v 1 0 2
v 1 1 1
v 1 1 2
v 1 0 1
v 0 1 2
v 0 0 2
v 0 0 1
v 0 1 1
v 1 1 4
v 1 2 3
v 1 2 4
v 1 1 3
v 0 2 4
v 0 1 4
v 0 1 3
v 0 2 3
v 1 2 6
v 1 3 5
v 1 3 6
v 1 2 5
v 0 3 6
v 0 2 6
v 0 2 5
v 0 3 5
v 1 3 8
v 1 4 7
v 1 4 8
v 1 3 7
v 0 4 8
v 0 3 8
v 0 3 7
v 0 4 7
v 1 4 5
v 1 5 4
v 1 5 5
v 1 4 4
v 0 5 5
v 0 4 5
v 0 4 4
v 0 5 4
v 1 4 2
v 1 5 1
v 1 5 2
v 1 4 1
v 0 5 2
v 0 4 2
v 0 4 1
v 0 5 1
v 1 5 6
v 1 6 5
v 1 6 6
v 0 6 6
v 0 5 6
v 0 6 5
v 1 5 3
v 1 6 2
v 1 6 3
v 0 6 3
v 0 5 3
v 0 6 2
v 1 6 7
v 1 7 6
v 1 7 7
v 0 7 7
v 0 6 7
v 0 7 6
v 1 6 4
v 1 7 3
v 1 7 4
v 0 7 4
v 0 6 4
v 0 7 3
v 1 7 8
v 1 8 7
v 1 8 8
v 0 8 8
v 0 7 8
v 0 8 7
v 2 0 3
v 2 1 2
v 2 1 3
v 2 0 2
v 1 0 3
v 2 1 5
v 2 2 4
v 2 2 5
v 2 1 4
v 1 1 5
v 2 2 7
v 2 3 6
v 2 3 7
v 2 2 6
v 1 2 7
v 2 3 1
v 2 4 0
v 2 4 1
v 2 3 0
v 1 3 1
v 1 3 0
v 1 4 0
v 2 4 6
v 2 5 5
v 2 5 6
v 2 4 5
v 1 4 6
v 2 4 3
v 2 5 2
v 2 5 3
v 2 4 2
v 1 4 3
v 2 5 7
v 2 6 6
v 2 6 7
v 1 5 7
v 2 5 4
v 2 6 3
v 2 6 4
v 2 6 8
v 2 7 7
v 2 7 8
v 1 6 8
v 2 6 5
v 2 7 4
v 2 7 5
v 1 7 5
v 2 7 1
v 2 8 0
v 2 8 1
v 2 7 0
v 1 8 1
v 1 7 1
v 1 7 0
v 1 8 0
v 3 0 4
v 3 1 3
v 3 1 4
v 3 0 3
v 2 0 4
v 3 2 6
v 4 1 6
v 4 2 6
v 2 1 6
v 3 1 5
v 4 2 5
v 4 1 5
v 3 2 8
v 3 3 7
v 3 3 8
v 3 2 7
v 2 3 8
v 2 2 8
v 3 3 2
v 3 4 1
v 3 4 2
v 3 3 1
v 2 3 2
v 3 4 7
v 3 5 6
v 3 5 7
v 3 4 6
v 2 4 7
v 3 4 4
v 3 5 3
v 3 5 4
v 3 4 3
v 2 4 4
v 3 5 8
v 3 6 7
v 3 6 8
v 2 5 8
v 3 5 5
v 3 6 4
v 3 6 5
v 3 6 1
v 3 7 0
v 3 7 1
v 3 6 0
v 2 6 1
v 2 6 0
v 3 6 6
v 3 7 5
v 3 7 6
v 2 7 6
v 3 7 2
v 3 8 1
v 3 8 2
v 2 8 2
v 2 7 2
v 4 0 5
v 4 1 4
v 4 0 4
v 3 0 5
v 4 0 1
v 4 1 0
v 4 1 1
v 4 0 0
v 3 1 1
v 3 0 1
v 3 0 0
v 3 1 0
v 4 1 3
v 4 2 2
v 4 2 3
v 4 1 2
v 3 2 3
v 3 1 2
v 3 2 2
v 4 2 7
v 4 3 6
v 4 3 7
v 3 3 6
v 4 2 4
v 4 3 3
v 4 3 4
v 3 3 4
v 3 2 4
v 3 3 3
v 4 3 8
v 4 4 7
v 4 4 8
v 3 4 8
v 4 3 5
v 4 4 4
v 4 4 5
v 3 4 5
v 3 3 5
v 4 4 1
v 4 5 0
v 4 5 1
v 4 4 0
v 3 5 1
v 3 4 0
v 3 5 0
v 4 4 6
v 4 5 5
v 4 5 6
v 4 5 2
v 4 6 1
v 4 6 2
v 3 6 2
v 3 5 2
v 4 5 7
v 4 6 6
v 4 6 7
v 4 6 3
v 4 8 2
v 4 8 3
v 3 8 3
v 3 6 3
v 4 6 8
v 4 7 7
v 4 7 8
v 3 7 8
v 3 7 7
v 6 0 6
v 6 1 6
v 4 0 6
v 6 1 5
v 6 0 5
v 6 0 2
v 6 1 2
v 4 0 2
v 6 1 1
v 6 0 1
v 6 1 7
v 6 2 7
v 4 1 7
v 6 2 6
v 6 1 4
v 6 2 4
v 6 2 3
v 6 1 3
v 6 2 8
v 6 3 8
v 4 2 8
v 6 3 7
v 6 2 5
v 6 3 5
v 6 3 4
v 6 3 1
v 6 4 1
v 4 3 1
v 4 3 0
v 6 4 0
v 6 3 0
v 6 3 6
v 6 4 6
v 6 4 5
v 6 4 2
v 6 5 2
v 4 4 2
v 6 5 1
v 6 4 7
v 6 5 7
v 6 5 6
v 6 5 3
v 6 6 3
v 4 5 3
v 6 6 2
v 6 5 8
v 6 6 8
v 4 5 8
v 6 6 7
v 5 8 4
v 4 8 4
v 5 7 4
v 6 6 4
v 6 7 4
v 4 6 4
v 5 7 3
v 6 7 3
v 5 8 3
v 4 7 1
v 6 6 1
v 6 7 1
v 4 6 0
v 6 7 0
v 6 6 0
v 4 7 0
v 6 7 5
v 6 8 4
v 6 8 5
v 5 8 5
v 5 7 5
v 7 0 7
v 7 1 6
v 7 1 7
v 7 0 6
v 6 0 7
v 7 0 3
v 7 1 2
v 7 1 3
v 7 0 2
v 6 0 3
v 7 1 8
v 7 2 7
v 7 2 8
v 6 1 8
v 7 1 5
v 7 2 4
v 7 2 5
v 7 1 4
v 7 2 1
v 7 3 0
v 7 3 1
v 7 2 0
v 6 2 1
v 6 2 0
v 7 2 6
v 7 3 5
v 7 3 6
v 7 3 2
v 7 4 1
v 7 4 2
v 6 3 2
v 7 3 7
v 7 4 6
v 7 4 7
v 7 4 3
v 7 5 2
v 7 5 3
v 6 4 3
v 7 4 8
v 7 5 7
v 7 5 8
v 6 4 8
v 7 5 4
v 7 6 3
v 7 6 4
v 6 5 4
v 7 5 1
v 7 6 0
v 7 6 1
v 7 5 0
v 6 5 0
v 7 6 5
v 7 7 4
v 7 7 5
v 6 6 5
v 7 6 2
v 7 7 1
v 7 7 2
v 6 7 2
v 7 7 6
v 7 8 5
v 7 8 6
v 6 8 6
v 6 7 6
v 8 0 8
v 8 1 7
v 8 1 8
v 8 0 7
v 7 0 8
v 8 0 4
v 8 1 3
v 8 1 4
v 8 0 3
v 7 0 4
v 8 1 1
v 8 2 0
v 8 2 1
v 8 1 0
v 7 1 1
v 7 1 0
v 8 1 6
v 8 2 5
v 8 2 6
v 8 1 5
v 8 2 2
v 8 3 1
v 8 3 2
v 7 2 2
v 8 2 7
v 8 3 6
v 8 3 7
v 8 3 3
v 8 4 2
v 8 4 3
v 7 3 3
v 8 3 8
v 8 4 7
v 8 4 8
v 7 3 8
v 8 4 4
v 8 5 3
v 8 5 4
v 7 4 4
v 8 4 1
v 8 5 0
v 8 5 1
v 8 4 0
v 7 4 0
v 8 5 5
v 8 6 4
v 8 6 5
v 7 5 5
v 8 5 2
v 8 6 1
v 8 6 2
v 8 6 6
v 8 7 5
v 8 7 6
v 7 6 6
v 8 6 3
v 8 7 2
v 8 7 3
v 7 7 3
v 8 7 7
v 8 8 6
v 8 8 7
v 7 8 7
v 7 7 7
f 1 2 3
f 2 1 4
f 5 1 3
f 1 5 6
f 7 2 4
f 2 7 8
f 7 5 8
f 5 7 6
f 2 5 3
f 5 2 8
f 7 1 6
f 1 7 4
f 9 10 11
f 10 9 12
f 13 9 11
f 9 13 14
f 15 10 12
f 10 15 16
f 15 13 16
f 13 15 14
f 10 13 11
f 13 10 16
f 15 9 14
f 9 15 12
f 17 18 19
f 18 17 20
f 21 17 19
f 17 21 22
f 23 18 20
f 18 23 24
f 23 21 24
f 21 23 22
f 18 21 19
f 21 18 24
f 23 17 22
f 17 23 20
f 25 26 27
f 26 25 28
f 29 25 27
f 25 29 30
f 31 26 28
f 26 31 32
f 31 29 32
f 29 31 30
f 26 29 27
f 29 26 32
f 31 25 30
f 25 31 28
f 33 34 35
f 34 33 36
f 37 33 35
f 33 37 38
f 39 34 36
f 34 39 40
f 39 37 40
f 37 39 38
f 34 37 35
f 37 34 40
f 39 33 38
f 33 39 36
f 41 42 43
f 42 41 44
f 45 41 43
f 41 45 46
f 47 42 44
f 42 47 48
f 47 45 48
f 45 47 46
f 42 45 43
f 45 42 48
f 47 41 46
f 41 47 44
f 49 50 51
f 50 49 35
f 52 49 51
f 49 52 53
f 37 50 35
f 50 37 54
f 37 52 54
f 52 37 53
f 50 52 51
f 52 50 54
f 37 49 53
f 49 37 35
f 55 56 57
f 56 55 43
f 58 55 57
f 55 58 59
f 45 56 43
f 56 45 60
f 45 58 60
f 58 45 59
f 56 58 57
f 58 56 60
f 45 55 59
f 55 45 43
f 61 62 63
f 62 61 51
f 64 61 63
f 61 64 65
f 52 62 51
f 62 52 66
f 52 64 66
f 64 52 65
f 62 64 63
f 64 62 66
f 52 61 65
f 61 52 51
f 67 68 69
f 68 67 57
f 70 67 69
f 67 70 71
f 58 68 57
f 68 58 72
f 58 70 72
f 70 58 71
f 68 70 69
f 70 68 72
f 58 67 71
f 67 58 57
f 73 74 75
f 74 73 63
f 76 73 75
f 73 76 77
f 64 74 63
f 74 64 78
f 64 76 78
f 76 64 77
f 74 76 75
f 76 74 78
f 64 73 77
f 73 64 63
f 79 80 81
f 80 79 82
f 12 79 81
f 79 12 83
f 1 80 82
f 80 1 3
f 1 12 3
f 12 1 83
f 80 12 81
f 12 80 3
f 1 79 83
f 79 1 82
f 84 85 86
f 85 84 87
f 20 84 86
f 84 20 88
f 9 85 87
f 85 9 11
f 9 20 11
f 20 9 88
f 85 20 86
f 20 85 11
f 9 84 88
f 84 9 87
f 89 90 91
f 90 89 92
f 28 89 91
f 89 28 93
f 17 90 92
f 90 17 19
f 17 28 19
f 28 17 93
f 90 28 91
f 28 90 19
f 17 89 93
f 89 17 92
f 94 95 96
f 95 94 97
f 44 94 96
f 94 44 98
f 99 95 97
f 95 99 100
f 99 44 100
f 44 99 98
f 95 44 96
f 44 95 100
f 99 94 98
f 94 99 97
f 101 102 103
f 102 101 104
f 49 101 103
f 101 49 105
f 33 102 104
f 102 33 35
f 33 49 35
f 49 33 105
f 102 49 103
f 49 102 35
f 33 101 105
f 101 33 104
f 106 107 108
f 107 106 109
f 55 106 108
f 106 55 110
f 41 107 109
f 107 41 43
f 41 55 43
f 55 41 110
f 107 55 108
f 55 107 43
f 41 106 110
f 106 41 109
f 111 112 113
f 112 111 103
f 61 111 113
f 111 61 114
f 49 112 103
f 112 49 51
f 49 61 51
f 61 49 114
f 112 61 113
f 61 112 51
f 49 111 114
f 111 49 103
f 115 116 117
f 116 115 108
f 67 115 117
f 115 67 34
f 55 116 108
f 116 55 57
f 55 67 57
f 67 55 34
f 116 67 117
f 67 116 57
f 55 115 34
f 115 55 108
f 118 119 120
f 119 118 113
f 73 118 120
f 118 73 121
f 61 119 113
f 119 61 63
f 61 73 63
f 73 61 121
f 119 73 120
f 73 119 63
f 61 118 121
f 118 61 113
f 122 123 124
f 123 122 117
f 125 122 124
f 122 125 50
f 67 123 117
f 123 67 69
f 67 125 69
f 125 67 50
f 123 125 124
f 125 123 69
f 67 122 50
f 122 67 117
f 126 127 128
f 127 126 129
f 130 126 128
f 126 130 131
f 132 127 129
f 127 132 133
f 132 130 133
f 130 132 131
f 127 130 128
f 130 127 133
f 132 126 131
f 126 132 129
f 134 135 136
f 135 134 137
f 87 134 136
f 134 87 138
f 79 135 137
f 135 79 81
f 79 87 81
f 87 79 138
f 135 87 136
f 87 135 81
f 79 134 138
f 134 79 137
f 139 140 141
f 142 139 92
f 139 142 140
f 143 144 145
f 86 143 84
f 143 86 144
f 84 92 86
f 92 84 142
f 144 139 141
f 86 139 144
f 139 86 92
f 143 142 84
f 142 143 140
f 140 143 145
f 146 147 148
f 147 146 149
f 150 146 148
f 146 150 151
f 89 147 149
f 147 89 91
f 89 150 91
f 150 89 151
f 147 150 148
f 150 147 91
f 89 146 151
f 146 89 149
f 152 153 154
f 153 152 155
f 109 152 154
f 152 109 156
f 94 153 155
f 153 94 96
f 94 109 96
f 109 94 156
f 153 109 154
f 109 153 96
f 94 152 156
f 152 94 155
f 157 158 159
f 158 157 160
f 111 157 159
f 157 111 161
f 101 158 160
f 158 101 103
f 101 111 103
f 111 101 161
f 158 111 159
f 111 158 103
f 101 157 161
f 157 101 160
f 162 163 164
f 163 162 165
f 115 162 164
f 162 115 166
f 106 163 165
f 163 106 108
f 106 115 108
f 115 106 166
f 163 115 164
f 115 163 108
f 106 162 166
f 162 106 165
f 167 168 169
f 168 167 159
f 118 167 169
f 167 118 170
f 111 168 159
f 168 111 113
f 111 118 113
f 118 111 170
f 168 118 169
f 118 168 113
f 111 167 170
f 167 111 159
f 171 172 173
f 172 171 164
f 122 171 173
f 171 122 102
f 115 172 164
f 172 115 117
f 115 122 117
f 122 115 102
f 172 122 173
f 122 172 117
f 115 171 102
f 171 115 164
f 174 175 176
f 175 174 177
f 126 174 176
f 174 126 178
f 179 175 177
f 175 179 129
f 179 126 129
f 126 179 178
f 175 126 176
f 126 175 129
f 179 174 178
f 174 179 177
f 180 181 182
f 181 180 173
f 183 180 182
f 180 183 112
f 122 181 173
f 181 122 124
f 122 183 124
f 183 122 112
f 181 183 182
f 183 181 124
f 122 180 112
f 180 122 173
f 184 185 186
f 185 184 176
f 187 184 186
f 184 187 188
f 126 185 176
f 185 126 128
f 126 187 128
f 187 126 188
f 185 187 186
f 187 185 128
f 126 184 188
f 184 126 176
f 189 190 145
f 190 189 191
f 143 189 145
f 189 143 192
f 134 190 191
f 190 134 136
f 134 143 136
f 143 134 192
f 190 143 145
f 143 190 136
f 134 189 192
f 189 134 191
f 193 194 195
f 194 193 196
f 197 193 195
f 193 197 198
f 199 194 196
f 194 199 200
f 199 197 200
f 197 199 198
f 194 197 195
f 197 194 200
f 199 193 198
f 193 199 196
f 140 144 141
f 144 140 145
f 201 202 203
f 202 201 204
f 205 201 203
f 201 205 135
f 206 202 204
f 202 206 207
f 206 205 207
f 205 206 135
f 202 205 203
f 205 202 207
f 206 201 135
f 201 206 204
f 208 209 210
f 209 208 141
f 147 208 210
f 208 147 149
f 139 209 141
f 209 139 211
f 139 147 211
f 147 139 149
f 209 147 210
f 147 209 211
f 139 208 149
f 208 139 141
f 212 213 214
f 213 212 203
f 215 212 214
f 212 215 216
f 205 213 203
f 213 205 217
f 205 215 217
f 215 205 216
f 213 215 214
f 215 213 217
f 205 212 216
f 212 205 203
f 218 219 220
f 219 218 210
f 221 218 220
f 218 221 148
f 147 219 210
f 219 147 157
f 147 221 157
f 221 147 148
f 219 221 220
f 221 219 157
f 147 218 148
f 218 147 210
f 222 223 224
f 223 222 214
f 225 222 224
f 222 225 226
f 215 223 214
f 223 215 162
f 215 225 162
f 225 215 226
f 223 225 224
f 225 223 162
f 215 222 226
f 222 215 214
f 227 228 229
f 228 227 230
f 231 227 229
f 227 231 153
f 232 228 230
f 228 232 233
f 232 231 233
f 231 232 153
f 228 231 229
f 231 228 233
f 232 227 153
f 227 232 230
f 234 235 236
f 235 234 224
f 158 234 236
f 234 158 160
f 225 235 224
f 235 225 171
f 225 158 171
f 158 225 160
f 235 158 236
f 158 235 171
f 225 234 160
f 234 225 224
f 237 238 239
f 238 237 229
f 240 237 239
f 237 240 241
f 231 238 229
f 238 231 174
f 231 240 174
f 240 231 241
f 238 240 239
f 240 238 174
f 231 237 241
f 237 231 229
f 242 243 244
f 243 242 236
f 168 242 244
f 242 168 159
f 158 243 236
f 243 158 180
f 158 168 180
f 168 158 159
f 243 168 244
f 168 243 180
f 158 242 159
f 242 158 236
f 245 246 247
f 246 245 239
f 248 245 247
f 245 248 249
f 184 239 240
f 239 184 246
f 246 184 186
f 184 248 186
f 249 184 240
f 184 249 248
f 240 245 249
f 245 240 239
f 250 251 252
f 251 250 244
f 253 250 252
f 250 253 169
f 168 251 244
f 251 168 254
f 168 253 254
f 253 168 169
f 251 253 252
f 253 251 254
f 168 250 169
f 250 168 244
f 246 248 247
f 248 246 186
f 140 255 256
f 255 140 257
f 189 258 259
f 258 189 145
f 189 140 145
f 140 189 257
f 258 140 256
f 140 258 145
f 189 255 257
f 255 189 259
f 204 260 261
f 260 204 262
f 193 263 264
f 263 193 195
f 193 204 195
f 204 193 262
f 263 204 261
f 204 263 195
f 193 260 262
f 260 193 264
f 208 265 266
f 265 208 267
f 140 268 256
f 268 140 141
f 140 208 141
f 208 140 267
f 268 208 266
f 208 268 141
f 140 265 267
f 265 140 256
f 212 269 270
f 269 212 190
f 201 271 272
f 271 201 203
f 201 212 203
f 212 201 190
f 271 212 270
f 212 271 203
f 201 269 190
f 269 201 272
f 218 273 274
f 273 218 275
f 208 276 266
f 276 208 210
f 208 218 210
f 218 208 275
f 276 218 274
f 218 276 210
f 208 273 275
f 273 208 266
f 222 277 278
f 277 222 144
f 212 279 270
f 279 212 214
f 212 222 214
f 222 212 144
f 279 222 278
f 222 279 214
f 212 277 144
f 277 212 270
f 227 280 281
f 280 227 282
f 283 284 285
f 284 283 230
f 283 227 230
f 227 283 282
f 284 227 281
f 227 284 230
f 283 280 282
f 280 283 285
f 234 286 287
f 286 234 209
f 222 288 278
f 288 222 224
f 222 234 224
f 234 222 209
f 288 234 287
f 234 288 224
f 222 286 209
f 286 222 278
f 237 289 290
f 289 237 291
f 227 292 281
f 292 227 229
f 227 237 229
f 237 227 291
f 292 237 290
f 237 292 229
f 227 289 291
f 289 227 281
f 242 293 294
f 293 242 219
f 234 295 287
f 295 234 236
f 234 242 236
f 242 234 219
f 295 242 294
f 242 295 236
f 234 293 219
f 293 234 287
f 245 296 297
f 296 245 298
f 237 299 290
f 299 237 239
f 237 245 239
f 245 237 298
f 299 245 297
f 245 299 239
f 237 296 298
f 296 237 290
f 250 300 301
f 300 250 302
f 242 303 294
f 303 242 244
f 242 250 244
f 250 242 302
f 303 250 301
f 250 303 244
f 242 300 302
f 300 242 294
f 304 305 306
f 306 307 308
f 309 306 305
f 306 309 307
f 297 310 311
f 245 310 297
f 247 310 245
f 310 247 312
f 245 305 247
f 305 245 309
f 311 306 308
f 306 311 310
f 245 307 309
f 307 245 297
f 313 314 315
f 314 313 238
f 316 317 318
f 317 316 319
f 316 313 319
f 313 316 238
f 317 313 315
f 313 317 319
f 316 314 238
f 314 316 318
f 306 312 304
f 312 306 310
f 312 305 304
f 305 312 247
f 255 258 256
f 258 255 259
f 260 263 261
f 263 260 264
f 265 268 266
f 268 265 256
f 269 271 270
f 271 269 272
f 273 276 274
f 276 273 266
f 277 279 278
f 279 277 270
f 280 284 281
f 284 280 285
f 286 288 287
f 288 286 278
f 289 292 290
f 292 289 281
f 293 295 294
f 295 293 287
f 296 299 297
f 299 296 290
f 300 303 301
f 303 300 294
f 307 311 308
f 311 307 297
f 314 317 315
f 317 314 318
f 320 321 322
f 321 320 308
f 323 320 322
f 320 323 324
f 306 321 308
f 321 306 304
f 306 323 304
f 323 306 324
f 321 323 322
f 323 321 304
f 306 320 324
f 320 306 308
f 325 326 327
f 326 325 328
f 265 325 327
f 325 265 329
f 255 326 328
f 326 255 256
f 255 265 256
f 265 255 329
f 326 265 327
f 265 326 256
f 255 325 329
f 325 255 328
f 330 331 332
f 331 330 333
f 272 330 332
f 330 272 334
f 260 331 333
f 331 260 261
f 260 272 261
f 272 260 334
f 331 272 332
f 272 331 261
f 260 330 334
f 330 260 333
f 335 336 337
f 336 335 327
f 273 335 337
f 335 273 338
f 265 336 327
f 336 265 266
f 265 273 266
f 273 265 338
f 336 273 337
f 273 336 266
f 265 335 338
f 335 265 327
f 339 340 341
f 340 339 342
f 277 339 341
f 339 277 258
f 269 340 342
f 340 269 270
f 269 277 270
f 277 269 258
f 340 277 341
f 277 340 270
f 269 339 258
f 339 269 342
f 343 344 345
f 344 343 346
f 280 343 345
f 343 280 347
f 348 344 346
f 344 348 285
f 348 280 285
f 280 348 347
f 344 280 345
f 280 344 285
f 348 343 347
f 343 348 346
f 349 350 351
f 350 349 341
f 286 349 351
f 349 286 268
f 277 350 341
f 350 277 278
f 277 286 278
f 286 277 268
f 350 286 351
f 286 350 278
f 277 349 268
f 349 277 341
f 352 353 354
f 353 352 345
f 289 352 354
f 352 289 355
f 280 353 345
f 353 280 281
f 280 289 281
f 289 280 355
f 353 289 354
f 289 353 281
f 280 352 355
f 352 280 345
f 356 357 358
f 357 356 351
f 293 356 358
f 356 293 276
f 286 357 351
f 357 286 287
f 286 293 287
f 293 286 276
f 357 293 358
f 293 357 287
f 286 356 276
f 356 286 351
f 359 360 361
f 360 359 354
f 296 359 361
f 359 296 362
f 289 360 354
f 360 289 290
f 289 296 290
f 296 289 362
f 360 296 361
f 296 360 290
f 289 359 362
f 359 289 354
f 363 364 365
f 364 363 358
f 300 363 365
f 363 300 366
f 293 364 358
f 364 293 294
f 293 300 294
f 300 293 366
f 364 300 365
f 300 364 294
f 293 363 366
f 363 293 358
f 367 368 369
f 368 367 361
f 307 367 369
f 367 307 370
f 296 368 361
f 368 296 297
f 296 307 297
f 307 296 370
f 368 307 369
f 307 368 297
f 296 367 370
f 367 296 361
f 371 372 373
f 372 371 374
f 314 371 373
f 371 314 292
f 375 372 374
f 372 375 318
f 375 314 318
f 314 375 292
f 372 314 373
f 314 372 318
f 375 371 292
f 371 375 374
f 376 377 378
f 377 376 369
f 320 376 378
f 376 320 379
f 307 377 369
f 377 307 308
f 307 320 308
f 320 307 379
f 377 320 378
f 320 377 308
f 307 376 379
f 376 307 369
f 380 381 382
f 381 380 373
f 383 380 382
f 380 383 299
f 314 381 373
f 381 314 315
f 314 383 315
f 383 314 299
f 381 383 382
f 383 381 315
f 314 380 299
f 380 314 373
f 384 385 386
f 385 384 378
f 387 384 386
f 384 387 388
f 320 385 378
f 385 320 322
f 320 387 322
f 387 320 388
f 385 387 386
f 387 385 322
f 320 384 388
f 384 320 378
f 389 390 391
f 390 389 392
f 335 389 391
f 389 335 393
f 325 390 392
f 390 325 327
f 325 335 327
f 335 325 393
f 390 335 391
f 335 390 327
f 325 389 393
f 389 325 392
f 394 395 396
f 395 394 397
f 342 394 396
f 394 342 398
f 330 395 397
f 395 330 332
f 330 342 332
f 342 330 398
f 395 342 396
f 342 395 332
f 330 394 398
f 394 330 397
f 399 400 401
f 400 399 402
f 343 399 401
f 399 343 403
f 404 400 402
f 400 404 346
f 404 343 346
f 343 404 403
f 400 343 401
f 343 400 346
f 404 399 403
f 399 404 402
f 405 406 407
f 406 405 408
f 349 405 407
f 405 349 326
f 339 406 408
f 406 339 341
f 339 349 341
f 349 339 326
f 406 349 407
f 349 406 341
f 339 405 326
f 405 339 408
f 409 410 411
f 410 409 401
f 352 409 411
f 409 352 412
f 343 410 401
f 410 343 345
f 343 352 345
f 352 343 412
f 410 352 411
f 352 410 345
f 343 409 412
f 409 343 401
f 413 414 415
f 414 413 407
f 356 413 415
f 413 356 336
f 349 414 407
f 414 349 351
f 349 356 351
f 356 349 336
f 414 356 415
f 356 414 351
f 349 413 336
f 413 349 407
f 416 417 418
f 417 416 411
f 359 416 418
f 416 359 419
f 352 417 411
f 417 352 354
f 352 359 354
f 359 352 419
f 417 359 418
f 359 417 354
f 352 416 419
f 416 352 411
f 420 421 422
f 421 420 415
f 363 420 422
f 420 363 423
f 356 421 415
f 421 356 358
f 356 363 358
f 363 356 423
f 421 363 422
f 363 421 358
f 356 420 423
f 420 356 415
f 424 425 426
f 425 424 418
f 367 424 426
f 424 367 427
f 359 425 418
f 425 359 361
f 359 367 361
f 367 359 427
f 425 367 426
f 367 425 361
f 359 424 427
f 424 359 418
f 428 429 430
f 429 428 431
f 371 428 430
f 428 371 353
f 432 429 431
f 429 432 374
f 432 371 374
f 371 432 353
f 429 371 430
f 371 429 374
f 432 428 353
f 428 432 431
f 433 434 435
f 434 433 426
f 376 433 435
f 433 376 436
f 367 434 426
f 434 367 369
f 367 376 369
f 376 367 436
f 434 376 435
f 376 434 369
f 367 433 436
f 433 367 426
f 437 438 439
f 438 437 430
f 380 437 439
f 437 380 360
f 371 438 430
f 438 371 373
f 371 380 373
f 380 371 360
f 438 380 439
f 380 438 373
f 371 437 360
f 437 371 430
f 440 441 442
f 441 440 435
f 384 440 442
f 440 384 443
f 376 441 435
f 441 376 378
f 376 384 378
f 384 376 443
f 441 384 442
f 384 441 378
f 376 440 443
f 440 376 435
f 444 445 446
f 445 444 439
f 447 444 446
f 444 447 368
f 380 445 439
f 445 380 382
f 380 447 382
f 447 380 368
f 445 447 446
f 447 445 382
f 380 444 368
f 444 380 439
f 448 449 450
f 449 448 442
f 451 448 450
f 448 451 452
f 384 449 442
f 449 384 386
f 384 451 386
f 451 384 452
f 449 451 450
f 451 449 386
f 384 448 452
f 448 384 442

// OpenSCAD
union() {
    translate([0, 0, 1]) cube([1, 1, 1]);
    translate([0, 1, 3]) cube([1, 1, 1]);
    translate([0, 2, 5]) cube([1, 1, 1]);
    translate([0, 3, 7]) cube([1, 1, 1]);
    translate([0, 4, 4]) cube([1, 1, 1]);
    translate([0, 4, 1]) cube([1, 1, 1]);
    translate([0, 5, 5]) cube([1, 1, 1]);
    translate([0, 5, 2]) cube([1, 1, 1]);
    translate([0, 6, 6]) cube([1, 1, 1]);
    translate([0, 6, 3]) cube([1, 1, 1]);
    translate([0, 7, 7]) cube([1, 1, 1]);
    translate([1, 0, 2]) cube([1, 1, 1]);
    translate([1, 1, 4]) cube([1, 1, 1]);
    translate([1, 2, 6]) cube([1, 1, 1]);
    translate([1, 3, 0]) cube([1, 1, 1]);
    translate([1, 4, 5]) cube([1, 1, 1]);
    translate([1, 4, 2]) cube([1, 1, 1]);
    translate([1, 5, 6]) cube([1, 1, 1]);
    translate([1, 5, 3]) cube([1, 1, 1]);
    translate([1, 6, 7]) cube([1, 1, 1]);
    translate([1, 6, 4]) cube([1, 1, 1]);
    translate([1, 7, 0]) cube([1, 1, 1]);
    translate([2, 0, 3]) cube([1, 1, 1]);
    translate([2, 1, 5]) cube([1, 1, 1]);
    translate([2, 2, 7]) cube([1, 1, 1]);
    translate([2, 3, 1]) cube([1, 1, 1]);
    translate([2, 4, 6]) cube([1, 1, 1]);
    translate([2, 4, 3]) cube([1, 1, 1]);
    translate([2, 5, 7]) cube([1, 1, 1]);
    translate([2, 5, 4]) cube([1, 1, 1]);
    translate([2, 6, 0]) cube([1, 1, 1]);
    translate([2, 6, 5]) cube([1, 1, 1]);
    translate([2, 7, 1]) cube([1, 1, 1]);
    translate([3, 0, 4]) cube([1, 1, 1]);
    translate([3, 0, 0]) cube([1, 1, 1]);
    translate([3, 1, 5]) cube([1, 1, 1]);
    translate([3, 1, 2]) cube([1, 1, 1]);
    translate([3, 2, 6]) cube([1, 1, 1]);
    translate([3, 2, 3]) cube([1, 1, 1]);
    translate([3, 3, 7]) cube([1, 1, 1]);
    translate([3, 3, 4]) cube([1, 1, 1]);
    translate([3, 4, 0]) cube([1, 1, 1]);
    translate([3, 4, 5]) cube([1, 1, 1]);
    translate([3, 5, 1]) cube([1, 1, 1]);
    translate([3, 5, 6]) cube([1, 1, 1]);
    translate([3, 6, 2]) cube([1, 1, 1]);
    translate([3, 6, 7]) cube([1, 1, 1]);
    translate([3, 7, 2]) cube([1, 1, 1]);
    translate([4, 0, 5]) cube([1, 1, 1]);
    translate([4, 0, 1]) cube([1, 1, 1]);
    translate([4, 1, 6]) cube([1, 1, 1]);
    translate([4, 1, 3]) cube([1, 1, 1]);
    translate([4, 2, 7]) cube([1, 1, 1]);
    translate([4, 2, 4]) cube([1, 1, 1]);
    translate([4, 3, 0]) cube([1, 1, 1]);
    translate([4, 3, 5]) cube([1, 1, 1]);
    translate([4, 4, 1]) cube([1, 1, 1]);
    translate([4, 4, 6]) cube([1, 1, 1]);
    translate([4, 5, 2]) cube([1, 1, 1]);
    translate([4, 5, 7]) cube([1, 1, 1]);
    translate([4, 6, 3]) cube([1, 1, 1]);
    translate([4, 6, 0]) cube([1, 1, 1]);
    translate([4, 7, 3]) cube([1, 1, 1]);
    translate([5, 0, 5]) cube([1, 1, 1]);
    translate([5, 0, 1]) cube([1, 1, 1]);
    translate([5, 1, 6]) cube([1, 1, 1]);
    translate([5, 1, 3]) cube([1, 1, 1]);
    translate([5, 2, 7]) cube([1, 1, 1]);
    translate([5, 2, 4]) cube([1, 1, 1]);
    translate([5, 3, 0]) cube([1, 1, 1]);
    translate([5, 3, 5]) cube([1, 1, 1]);
    translate([5, 4, 1]) cube([1, 1, 1]);
    translate([5, 4, 6]) cube([1, 1, 1]);
    translate([5, 5, 2]) cube([1, 1, 1]);
    translate([5, 5, 7]) cube([1, 1, 1]);
    translate([5, 6, 3]) cube([1, 1, 1]);
    translate([5, 6, 0]) cube([1, 1, 1]);
    translate([5, 7, 4]) cube([1, 1, 1]);
    translate([6, 0, 6]) cube([1, 1, 1]);
    translate([6, 0, 2]) cube([1, 1, 1]);
    translate([6, 1, 7]) cube([1, 1, 1]);
    translate([6, 1, 4]) cube([1, 1, 1]);
    translate([6, 2, 0]) cube([1, 1, 1]);
    translate([6, 2, 5]) cube([1, 1, 1]);
    translate([6, 3, 1]) cube([1, 1, 1]);
    translate([6, 3, 6]) cube([1, 1, 1]);
    translate([6, 4, 2]) cube([1, 1, 1]);
    translate([6, 4, 7]) cube([1, 1, 1]);
    translate([6, 5, 3]) cube([1, 1, 1]);
    translate([6, 5, 0]) cube([1, 1, 1]);
    translate([6, 6, 4]) cube([1, 1, 1]);
    translate([6, 6, 1]) cube([1, 1, 1]);
    translate([6, 7, 5]) cube([1, 1, 1]);
    translate([7, 0, 7]) cube([1, 1, 1]);
    translate([7, 0, 3]) cube([1, 1, 1]);
    translate([7, 1, 0]) cube([1, 1, 1]);
    translate([7, 1, 5]) cube([1, 1, 1]);
    translate([7, 2, 1]) cube([1, 1, 1]);
    translate([7, 2, 6]) cube([1, 1, 1]);
    translate([7, 3, 2]) cube([1, 1, 1]);
    translate([7, 3, 7]) cube([1, 1, 1]);
    translate([7, 4, 3]) cube([1, 1, 1]);
    translate([7, 4, 0]) cube([1, 1, 1]);
    translate([7, 5, 4]) cube([1, 1, 1]);
    translate([7, 5, 1]) cube([1, 1, 1]);
    translate([7, 6, 5]) cube([1, 1, 1]);
    translate([7, 6, 2]) cube([1, 1, 1]);
    translate([7, 7, 6]) cube([1, 1, 1]);
}
